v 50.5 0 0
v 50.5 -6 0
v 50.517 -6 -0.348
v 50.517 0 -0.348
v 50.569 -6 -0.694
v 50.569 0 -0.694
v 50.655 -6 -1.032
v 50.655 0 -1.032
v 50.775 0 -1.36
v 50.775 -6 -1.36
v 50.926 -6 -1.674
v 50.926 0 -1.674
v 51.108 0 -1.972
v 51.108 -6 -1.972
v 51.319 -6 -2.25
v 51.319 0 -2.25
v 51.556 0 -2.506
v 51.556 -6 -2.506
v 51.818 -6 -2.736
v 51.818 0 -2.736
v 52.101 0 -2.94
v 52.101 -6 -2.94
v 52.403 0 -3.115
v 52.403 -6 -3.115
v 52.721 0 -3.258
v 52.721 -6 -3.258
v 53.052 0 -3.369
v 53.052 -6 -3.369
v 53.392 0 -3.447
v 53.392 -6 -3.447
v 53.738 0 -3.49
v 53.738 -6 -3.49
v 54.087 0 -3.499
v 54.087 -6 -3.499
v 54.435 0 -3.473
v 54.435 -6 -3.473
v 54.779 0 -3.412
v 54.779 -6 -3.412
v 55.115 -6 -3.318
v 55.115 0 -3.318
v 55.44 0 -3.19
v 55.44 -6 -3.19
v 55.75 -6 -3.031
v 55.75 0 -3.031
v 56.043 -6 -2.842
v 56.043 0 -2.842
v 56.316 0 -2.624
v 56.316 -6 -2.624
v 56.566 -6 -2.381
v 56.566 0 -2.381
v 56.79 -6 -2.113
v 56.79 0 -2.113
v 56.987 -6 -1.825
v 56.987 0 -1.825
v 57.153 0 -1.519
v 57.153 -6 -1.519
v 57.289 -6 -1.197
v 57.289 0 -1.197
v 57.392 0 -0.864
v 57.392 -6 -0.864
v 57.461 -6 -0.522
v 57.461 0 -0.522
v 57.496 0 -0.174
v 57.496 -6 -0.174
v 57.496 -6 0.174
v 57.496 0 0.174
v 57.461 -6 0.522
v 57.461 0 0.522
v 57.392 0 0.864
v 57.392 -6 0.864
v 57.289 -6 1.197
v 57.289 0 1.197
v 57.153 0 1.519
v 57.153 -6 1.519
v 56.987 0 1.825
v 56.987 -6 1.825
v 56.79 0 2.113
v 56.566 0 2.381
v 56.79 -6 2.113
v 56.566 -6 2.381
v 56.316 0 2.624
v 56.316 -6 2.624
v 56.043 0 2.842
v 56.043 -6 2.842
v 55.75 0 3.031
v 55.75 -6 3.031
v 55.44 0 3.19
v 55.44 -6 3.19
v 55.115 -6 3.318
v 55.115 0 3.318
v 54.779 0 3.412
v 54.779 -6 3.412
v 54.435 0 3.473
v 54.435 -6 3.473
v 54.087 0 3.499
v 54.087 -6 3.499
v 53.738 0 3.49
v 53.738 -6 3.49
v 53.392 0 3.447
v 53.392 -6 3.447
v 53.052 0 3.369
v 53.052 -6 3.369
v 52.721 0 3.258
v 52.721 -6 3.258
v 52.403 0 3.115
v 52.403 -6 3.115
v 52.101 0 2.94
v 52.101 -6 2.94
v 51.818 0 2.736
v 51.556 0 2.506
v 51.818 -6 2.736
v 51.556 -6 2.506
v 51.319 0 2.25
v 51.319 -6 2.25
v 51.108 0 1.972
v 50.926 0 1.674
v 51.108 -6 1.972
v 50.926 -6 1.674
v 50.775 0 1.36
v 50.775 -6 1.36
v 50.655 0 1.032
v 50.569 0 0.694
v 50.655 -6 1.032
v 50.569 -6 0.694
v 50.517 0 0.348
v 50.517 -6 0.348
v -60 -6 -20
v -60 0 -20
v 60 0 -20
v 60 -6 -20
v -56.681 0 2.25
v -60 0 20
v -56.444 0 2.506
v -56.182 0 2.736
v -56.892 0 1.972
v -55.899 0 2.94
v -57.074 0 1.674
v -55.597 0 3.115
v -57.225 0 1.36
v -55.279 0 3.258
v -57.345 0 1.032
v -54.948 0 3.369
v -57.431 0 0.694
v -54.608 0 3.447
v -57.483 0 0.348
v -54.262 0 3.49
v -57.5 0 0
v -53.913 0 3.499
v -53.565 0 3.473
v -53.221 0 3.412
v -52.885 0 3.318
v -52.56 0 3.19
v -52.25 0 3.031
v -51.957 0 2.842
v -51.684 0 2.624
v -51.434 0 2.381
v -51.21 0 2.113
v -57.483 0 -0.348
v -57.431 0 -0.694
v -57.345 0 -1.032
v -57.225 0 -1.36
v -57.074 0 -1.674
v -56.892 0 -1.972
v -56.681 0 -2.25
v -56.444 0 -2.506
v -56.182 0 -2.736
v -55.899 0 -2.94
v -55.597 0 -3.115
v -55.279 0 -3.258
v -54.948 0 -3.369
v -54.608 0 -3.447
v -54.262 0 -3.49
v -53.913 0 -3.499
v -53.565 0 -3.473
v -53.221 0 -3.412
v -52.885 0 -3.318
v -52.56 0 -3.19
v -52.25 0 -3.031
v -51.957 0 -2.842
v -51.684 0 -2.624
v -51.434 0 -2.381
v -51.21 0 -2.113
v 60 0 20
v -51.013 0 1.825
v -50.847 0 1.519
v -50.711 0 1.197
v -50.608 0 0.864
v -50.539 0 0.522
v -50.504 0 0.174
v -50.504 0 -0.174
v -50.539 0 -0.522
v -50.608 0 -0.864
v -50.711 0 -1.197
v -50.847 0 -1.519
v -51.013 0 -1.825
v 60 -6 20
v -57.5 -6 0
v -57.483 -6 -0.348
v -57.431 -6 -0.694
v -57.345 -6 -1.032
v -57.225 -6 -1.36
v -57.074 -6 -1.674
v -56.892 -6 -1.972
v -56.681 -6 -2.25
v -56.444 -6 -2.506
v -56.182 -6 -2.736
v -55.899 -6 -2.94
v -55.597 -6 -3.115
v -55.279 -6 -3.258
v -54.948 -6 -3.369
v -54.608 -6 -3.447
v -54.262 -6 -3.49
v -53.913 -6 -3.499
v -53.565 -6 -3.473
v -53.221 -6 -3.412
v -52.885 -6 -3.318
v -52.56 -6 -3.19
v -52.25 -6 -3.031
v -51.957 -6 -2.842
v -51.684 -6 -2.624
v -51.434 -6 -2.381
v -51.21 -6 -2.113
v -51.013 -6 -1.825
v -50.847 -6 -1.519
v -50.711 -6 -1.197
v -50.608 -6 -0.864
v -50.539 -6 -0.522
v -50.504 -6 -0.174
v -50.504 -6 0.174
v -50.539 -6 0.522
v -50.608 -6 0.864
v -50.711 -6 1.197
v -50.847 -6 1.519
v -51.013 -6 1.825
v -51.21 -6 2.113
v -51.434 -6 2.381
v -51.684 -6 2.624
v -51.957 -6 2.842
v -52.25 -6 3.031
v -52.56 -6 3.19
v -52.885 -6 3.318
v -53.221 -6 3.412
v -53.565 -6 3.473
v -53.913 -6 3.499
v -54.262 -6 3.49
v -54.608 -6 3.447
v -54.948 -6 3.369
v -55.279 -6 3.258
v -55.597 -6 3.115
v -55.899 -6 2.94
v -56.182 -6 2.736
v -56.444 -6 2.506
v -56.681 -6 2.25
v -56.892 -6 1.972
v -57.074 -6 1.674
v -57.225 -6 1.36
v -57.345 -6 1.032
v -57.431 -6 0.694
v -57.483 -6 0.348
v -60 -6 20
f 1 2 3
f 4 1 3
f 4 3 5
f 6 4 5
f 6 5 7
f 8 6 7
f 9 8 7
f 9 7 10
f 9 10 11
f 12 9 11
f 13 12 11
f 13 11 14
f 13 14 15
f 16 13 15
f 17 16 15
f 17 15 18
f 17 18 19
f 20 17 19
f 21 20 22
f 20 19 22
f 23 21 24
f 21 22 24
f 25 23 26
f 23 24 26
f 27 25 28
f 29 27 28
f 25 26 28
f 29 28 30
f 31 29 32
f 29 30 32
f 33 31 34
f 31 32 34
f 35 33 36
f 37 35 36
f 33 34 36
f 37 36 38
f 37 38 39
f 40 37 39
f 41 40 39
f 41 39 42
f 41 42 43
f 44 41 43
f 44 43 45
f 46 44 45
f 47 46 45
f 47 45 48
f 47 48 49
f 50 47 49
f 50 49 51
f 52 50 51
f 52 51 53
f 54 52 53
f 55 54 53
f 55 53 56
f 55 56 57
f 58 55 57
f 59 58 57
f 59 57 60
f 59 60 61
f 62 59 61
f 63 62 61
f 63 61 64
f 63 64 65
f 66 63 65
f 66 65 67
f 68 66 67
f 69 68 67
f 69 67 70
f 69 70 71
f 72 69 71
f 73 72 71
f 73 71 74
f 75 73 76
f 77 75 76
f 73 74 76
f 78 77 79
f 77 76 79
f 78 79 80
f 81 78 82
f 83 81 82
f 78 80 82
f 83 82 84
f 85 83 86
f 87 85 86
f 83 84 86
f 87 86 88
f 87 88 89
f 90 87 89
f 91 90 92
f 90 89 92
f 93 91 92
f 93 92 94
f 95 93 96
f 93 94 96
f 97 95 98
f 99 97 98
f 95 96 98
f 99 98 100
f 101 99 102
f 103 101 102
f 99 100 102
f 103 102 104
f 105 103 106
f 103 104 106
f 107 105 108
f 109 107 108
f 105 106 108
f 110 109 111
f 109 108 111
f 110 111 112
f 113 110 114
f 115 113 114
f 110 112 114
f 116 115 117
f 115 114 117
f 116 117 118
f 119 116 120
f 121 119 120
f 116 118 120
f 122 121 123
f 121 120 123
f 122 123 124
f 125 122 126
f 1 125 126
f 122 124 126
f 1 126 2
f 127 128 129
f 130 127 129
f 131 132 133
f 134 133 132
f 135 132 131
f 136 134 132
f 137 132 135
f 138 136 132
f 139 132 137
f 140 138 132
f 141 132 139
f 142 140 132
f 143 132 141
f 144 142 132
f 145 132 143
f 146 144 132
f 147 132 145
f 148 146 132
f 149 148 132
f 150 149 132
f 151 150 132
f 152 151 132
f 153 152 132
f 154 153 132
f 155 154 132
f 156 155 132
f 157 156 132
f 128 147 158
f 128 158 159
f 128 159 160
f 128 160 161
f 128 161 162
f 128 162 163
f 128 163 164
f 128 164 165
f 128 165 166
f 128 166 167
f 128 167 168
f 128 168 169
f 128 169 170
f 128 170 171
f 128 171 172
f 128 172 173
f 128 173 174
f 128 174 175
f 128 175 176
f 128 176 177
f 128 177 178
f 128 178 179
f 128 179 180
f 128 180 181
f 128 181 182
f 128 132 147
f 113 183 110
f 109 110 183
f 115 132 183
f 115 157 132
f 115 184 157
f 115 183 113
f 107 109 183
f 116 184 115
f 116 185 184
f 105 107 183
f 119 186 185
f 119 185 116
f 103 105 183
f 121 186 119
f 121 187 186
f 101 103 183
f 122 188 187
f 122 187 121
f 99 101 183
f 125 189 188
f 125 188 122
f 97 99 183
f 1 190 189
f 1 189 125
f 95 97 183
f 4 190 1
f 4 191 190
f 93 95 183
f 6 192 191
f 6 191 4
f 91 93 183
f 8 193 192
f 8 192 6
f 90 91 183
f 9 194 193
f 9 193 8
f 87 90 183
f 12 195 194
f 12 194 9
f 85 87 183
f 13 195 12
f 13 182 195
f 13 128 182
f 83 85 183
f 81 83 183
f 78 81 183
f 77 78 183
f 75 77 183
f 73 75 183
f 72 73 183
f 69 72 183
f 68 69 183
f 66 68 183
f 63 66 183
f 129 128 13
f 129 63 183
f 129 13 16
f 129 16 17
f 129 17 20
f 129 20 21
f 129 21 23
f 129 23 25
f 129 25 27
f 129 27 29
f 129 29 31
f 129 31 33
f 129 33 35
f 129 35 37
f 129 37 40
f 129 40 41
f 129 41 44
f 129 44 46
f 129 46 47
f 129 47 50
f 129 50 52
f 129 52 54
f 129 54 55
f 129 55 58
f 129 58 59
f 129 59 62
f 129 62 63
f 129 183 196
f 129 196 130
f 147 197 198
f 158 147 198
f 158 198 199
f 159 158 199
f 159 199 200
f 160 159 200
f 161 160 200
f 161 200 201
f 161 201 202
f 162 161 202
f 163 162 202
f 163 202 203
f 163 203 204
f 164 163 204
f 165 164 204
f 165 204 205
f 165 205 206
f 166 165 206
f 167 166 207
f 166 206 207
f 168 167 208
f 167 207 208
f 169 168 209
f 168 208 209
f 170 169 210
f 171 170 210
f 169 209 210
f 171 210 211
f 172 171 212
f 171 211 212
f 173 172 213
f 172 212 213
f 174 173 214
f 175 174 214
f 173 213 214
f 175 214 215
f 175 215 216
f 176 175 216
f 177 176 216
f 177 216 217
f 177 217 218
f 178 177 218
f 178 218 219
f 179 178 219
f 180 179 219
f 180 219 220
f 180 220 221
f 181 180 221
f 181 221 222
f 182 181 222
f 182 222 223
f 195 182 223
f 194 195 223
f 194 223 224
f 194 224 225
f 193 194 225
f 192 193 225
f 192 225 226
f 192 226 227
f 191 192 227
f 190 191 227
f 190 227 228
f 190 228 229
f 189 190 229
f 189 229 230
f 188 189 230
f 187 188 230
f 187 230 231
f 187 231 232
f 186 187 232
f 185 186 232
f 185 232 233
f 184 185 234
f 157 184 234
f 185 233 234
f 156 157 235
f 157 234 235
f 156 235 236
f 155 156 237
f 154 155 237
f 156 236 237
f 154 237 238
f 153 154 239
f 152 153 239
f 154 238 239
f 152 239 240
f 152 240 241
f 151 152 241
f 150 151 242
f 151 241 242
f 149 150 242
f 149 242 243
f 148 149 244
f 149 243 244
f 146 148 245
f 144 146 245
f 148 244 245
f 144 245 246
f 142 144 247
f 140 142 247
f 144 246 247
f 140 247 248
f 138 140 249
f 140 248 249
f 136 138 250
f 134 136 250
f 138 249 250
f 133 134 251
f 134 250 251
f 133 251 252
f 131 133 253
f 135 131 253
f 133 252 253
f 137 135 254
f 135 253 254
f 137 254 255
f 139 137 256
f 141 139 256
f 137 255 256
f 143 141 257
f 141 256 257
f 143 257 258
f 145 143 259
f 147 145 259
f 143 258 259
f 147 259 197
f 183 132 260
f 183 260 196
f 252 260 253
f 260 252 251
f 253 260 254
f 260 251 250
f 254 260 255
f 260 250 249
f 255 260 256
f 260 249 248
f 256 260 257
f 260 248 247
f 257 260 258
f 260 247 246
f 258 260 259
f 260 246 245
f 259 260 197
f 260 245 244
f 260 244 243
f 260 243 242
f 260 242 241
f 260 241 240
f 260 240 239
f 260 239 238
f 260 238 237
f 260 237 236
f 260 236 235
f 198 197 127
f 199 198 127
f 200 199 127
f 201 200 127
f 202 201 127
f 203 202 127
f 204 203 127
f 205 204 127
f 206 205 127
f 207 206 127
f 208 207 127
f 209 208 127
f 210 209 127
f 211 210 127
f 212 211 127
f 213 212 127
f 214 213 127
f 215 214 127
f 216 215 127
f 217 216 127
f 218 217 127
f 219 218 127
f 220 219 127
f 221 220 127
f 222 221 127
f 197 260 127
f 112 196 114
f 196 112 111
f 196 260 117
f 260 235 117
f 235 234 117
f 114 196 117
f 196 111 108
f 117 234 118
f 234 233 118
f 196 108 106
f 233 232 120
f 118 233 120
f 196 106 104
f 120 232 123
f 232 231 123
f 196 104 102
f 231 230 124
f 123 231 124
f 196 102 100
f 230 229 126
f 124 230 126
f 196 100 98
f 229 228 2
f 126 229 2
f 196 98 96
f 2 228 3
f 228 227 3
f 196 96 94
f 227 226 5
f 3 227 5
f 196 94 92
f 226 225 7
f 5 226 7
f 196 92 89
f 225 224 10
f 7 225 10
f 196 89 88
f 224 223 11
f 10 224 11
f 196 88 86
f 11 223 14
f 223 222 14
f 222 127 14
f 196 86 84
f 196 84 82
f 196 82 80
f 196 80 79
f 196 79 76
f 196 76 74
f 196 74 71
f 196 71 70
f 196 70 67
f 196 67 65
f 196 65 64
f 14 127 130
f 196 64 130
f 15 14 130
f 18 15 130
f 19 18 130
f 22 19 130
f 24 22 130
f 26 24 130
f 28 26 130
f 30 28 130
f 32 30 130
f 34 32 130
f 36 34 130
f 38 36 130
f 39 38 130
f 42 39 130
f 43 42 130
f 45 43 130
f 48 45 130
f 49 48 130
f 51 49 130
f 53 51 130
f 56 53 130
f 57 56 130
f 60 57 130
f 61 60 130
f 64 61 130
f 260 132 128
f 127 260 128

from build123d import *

# Parameters (mm, degrees)
ESQUISSE1_W               = 120
ESQUISSE1_H               = 40
T_LE_DE_BASE_PLI_E1_DEPTH = 6
D_GAGEMENT_M61_D          = 7


# Sheet-metal steps are written as plain solids
with BuildPart() as part:
    # Esquisse1 → Tôle de base pliée1 (new body)
    with BuildSketch(Plane(origin=(0, 0, 0), x_dir=(1, 0, 0), z_dir=(0, 1, 0))):
        Rectangle(ESQUISSE1_W, ESQUISSE1_H)
    extrude(amount=-T_LE_DE_BASE_PLI_E1_DEPTH)

    # Dégagement M61 (through all)
    with Locations(Plane(origin=(0, 0, 0), x_dir=(1, 0, 0), z_dir=(0, 1, 0))):
        with Locations((54, 0), (-54, 0)):
            Hole(D_GAGEMENT_M61_D / 2)


solid = part.part
